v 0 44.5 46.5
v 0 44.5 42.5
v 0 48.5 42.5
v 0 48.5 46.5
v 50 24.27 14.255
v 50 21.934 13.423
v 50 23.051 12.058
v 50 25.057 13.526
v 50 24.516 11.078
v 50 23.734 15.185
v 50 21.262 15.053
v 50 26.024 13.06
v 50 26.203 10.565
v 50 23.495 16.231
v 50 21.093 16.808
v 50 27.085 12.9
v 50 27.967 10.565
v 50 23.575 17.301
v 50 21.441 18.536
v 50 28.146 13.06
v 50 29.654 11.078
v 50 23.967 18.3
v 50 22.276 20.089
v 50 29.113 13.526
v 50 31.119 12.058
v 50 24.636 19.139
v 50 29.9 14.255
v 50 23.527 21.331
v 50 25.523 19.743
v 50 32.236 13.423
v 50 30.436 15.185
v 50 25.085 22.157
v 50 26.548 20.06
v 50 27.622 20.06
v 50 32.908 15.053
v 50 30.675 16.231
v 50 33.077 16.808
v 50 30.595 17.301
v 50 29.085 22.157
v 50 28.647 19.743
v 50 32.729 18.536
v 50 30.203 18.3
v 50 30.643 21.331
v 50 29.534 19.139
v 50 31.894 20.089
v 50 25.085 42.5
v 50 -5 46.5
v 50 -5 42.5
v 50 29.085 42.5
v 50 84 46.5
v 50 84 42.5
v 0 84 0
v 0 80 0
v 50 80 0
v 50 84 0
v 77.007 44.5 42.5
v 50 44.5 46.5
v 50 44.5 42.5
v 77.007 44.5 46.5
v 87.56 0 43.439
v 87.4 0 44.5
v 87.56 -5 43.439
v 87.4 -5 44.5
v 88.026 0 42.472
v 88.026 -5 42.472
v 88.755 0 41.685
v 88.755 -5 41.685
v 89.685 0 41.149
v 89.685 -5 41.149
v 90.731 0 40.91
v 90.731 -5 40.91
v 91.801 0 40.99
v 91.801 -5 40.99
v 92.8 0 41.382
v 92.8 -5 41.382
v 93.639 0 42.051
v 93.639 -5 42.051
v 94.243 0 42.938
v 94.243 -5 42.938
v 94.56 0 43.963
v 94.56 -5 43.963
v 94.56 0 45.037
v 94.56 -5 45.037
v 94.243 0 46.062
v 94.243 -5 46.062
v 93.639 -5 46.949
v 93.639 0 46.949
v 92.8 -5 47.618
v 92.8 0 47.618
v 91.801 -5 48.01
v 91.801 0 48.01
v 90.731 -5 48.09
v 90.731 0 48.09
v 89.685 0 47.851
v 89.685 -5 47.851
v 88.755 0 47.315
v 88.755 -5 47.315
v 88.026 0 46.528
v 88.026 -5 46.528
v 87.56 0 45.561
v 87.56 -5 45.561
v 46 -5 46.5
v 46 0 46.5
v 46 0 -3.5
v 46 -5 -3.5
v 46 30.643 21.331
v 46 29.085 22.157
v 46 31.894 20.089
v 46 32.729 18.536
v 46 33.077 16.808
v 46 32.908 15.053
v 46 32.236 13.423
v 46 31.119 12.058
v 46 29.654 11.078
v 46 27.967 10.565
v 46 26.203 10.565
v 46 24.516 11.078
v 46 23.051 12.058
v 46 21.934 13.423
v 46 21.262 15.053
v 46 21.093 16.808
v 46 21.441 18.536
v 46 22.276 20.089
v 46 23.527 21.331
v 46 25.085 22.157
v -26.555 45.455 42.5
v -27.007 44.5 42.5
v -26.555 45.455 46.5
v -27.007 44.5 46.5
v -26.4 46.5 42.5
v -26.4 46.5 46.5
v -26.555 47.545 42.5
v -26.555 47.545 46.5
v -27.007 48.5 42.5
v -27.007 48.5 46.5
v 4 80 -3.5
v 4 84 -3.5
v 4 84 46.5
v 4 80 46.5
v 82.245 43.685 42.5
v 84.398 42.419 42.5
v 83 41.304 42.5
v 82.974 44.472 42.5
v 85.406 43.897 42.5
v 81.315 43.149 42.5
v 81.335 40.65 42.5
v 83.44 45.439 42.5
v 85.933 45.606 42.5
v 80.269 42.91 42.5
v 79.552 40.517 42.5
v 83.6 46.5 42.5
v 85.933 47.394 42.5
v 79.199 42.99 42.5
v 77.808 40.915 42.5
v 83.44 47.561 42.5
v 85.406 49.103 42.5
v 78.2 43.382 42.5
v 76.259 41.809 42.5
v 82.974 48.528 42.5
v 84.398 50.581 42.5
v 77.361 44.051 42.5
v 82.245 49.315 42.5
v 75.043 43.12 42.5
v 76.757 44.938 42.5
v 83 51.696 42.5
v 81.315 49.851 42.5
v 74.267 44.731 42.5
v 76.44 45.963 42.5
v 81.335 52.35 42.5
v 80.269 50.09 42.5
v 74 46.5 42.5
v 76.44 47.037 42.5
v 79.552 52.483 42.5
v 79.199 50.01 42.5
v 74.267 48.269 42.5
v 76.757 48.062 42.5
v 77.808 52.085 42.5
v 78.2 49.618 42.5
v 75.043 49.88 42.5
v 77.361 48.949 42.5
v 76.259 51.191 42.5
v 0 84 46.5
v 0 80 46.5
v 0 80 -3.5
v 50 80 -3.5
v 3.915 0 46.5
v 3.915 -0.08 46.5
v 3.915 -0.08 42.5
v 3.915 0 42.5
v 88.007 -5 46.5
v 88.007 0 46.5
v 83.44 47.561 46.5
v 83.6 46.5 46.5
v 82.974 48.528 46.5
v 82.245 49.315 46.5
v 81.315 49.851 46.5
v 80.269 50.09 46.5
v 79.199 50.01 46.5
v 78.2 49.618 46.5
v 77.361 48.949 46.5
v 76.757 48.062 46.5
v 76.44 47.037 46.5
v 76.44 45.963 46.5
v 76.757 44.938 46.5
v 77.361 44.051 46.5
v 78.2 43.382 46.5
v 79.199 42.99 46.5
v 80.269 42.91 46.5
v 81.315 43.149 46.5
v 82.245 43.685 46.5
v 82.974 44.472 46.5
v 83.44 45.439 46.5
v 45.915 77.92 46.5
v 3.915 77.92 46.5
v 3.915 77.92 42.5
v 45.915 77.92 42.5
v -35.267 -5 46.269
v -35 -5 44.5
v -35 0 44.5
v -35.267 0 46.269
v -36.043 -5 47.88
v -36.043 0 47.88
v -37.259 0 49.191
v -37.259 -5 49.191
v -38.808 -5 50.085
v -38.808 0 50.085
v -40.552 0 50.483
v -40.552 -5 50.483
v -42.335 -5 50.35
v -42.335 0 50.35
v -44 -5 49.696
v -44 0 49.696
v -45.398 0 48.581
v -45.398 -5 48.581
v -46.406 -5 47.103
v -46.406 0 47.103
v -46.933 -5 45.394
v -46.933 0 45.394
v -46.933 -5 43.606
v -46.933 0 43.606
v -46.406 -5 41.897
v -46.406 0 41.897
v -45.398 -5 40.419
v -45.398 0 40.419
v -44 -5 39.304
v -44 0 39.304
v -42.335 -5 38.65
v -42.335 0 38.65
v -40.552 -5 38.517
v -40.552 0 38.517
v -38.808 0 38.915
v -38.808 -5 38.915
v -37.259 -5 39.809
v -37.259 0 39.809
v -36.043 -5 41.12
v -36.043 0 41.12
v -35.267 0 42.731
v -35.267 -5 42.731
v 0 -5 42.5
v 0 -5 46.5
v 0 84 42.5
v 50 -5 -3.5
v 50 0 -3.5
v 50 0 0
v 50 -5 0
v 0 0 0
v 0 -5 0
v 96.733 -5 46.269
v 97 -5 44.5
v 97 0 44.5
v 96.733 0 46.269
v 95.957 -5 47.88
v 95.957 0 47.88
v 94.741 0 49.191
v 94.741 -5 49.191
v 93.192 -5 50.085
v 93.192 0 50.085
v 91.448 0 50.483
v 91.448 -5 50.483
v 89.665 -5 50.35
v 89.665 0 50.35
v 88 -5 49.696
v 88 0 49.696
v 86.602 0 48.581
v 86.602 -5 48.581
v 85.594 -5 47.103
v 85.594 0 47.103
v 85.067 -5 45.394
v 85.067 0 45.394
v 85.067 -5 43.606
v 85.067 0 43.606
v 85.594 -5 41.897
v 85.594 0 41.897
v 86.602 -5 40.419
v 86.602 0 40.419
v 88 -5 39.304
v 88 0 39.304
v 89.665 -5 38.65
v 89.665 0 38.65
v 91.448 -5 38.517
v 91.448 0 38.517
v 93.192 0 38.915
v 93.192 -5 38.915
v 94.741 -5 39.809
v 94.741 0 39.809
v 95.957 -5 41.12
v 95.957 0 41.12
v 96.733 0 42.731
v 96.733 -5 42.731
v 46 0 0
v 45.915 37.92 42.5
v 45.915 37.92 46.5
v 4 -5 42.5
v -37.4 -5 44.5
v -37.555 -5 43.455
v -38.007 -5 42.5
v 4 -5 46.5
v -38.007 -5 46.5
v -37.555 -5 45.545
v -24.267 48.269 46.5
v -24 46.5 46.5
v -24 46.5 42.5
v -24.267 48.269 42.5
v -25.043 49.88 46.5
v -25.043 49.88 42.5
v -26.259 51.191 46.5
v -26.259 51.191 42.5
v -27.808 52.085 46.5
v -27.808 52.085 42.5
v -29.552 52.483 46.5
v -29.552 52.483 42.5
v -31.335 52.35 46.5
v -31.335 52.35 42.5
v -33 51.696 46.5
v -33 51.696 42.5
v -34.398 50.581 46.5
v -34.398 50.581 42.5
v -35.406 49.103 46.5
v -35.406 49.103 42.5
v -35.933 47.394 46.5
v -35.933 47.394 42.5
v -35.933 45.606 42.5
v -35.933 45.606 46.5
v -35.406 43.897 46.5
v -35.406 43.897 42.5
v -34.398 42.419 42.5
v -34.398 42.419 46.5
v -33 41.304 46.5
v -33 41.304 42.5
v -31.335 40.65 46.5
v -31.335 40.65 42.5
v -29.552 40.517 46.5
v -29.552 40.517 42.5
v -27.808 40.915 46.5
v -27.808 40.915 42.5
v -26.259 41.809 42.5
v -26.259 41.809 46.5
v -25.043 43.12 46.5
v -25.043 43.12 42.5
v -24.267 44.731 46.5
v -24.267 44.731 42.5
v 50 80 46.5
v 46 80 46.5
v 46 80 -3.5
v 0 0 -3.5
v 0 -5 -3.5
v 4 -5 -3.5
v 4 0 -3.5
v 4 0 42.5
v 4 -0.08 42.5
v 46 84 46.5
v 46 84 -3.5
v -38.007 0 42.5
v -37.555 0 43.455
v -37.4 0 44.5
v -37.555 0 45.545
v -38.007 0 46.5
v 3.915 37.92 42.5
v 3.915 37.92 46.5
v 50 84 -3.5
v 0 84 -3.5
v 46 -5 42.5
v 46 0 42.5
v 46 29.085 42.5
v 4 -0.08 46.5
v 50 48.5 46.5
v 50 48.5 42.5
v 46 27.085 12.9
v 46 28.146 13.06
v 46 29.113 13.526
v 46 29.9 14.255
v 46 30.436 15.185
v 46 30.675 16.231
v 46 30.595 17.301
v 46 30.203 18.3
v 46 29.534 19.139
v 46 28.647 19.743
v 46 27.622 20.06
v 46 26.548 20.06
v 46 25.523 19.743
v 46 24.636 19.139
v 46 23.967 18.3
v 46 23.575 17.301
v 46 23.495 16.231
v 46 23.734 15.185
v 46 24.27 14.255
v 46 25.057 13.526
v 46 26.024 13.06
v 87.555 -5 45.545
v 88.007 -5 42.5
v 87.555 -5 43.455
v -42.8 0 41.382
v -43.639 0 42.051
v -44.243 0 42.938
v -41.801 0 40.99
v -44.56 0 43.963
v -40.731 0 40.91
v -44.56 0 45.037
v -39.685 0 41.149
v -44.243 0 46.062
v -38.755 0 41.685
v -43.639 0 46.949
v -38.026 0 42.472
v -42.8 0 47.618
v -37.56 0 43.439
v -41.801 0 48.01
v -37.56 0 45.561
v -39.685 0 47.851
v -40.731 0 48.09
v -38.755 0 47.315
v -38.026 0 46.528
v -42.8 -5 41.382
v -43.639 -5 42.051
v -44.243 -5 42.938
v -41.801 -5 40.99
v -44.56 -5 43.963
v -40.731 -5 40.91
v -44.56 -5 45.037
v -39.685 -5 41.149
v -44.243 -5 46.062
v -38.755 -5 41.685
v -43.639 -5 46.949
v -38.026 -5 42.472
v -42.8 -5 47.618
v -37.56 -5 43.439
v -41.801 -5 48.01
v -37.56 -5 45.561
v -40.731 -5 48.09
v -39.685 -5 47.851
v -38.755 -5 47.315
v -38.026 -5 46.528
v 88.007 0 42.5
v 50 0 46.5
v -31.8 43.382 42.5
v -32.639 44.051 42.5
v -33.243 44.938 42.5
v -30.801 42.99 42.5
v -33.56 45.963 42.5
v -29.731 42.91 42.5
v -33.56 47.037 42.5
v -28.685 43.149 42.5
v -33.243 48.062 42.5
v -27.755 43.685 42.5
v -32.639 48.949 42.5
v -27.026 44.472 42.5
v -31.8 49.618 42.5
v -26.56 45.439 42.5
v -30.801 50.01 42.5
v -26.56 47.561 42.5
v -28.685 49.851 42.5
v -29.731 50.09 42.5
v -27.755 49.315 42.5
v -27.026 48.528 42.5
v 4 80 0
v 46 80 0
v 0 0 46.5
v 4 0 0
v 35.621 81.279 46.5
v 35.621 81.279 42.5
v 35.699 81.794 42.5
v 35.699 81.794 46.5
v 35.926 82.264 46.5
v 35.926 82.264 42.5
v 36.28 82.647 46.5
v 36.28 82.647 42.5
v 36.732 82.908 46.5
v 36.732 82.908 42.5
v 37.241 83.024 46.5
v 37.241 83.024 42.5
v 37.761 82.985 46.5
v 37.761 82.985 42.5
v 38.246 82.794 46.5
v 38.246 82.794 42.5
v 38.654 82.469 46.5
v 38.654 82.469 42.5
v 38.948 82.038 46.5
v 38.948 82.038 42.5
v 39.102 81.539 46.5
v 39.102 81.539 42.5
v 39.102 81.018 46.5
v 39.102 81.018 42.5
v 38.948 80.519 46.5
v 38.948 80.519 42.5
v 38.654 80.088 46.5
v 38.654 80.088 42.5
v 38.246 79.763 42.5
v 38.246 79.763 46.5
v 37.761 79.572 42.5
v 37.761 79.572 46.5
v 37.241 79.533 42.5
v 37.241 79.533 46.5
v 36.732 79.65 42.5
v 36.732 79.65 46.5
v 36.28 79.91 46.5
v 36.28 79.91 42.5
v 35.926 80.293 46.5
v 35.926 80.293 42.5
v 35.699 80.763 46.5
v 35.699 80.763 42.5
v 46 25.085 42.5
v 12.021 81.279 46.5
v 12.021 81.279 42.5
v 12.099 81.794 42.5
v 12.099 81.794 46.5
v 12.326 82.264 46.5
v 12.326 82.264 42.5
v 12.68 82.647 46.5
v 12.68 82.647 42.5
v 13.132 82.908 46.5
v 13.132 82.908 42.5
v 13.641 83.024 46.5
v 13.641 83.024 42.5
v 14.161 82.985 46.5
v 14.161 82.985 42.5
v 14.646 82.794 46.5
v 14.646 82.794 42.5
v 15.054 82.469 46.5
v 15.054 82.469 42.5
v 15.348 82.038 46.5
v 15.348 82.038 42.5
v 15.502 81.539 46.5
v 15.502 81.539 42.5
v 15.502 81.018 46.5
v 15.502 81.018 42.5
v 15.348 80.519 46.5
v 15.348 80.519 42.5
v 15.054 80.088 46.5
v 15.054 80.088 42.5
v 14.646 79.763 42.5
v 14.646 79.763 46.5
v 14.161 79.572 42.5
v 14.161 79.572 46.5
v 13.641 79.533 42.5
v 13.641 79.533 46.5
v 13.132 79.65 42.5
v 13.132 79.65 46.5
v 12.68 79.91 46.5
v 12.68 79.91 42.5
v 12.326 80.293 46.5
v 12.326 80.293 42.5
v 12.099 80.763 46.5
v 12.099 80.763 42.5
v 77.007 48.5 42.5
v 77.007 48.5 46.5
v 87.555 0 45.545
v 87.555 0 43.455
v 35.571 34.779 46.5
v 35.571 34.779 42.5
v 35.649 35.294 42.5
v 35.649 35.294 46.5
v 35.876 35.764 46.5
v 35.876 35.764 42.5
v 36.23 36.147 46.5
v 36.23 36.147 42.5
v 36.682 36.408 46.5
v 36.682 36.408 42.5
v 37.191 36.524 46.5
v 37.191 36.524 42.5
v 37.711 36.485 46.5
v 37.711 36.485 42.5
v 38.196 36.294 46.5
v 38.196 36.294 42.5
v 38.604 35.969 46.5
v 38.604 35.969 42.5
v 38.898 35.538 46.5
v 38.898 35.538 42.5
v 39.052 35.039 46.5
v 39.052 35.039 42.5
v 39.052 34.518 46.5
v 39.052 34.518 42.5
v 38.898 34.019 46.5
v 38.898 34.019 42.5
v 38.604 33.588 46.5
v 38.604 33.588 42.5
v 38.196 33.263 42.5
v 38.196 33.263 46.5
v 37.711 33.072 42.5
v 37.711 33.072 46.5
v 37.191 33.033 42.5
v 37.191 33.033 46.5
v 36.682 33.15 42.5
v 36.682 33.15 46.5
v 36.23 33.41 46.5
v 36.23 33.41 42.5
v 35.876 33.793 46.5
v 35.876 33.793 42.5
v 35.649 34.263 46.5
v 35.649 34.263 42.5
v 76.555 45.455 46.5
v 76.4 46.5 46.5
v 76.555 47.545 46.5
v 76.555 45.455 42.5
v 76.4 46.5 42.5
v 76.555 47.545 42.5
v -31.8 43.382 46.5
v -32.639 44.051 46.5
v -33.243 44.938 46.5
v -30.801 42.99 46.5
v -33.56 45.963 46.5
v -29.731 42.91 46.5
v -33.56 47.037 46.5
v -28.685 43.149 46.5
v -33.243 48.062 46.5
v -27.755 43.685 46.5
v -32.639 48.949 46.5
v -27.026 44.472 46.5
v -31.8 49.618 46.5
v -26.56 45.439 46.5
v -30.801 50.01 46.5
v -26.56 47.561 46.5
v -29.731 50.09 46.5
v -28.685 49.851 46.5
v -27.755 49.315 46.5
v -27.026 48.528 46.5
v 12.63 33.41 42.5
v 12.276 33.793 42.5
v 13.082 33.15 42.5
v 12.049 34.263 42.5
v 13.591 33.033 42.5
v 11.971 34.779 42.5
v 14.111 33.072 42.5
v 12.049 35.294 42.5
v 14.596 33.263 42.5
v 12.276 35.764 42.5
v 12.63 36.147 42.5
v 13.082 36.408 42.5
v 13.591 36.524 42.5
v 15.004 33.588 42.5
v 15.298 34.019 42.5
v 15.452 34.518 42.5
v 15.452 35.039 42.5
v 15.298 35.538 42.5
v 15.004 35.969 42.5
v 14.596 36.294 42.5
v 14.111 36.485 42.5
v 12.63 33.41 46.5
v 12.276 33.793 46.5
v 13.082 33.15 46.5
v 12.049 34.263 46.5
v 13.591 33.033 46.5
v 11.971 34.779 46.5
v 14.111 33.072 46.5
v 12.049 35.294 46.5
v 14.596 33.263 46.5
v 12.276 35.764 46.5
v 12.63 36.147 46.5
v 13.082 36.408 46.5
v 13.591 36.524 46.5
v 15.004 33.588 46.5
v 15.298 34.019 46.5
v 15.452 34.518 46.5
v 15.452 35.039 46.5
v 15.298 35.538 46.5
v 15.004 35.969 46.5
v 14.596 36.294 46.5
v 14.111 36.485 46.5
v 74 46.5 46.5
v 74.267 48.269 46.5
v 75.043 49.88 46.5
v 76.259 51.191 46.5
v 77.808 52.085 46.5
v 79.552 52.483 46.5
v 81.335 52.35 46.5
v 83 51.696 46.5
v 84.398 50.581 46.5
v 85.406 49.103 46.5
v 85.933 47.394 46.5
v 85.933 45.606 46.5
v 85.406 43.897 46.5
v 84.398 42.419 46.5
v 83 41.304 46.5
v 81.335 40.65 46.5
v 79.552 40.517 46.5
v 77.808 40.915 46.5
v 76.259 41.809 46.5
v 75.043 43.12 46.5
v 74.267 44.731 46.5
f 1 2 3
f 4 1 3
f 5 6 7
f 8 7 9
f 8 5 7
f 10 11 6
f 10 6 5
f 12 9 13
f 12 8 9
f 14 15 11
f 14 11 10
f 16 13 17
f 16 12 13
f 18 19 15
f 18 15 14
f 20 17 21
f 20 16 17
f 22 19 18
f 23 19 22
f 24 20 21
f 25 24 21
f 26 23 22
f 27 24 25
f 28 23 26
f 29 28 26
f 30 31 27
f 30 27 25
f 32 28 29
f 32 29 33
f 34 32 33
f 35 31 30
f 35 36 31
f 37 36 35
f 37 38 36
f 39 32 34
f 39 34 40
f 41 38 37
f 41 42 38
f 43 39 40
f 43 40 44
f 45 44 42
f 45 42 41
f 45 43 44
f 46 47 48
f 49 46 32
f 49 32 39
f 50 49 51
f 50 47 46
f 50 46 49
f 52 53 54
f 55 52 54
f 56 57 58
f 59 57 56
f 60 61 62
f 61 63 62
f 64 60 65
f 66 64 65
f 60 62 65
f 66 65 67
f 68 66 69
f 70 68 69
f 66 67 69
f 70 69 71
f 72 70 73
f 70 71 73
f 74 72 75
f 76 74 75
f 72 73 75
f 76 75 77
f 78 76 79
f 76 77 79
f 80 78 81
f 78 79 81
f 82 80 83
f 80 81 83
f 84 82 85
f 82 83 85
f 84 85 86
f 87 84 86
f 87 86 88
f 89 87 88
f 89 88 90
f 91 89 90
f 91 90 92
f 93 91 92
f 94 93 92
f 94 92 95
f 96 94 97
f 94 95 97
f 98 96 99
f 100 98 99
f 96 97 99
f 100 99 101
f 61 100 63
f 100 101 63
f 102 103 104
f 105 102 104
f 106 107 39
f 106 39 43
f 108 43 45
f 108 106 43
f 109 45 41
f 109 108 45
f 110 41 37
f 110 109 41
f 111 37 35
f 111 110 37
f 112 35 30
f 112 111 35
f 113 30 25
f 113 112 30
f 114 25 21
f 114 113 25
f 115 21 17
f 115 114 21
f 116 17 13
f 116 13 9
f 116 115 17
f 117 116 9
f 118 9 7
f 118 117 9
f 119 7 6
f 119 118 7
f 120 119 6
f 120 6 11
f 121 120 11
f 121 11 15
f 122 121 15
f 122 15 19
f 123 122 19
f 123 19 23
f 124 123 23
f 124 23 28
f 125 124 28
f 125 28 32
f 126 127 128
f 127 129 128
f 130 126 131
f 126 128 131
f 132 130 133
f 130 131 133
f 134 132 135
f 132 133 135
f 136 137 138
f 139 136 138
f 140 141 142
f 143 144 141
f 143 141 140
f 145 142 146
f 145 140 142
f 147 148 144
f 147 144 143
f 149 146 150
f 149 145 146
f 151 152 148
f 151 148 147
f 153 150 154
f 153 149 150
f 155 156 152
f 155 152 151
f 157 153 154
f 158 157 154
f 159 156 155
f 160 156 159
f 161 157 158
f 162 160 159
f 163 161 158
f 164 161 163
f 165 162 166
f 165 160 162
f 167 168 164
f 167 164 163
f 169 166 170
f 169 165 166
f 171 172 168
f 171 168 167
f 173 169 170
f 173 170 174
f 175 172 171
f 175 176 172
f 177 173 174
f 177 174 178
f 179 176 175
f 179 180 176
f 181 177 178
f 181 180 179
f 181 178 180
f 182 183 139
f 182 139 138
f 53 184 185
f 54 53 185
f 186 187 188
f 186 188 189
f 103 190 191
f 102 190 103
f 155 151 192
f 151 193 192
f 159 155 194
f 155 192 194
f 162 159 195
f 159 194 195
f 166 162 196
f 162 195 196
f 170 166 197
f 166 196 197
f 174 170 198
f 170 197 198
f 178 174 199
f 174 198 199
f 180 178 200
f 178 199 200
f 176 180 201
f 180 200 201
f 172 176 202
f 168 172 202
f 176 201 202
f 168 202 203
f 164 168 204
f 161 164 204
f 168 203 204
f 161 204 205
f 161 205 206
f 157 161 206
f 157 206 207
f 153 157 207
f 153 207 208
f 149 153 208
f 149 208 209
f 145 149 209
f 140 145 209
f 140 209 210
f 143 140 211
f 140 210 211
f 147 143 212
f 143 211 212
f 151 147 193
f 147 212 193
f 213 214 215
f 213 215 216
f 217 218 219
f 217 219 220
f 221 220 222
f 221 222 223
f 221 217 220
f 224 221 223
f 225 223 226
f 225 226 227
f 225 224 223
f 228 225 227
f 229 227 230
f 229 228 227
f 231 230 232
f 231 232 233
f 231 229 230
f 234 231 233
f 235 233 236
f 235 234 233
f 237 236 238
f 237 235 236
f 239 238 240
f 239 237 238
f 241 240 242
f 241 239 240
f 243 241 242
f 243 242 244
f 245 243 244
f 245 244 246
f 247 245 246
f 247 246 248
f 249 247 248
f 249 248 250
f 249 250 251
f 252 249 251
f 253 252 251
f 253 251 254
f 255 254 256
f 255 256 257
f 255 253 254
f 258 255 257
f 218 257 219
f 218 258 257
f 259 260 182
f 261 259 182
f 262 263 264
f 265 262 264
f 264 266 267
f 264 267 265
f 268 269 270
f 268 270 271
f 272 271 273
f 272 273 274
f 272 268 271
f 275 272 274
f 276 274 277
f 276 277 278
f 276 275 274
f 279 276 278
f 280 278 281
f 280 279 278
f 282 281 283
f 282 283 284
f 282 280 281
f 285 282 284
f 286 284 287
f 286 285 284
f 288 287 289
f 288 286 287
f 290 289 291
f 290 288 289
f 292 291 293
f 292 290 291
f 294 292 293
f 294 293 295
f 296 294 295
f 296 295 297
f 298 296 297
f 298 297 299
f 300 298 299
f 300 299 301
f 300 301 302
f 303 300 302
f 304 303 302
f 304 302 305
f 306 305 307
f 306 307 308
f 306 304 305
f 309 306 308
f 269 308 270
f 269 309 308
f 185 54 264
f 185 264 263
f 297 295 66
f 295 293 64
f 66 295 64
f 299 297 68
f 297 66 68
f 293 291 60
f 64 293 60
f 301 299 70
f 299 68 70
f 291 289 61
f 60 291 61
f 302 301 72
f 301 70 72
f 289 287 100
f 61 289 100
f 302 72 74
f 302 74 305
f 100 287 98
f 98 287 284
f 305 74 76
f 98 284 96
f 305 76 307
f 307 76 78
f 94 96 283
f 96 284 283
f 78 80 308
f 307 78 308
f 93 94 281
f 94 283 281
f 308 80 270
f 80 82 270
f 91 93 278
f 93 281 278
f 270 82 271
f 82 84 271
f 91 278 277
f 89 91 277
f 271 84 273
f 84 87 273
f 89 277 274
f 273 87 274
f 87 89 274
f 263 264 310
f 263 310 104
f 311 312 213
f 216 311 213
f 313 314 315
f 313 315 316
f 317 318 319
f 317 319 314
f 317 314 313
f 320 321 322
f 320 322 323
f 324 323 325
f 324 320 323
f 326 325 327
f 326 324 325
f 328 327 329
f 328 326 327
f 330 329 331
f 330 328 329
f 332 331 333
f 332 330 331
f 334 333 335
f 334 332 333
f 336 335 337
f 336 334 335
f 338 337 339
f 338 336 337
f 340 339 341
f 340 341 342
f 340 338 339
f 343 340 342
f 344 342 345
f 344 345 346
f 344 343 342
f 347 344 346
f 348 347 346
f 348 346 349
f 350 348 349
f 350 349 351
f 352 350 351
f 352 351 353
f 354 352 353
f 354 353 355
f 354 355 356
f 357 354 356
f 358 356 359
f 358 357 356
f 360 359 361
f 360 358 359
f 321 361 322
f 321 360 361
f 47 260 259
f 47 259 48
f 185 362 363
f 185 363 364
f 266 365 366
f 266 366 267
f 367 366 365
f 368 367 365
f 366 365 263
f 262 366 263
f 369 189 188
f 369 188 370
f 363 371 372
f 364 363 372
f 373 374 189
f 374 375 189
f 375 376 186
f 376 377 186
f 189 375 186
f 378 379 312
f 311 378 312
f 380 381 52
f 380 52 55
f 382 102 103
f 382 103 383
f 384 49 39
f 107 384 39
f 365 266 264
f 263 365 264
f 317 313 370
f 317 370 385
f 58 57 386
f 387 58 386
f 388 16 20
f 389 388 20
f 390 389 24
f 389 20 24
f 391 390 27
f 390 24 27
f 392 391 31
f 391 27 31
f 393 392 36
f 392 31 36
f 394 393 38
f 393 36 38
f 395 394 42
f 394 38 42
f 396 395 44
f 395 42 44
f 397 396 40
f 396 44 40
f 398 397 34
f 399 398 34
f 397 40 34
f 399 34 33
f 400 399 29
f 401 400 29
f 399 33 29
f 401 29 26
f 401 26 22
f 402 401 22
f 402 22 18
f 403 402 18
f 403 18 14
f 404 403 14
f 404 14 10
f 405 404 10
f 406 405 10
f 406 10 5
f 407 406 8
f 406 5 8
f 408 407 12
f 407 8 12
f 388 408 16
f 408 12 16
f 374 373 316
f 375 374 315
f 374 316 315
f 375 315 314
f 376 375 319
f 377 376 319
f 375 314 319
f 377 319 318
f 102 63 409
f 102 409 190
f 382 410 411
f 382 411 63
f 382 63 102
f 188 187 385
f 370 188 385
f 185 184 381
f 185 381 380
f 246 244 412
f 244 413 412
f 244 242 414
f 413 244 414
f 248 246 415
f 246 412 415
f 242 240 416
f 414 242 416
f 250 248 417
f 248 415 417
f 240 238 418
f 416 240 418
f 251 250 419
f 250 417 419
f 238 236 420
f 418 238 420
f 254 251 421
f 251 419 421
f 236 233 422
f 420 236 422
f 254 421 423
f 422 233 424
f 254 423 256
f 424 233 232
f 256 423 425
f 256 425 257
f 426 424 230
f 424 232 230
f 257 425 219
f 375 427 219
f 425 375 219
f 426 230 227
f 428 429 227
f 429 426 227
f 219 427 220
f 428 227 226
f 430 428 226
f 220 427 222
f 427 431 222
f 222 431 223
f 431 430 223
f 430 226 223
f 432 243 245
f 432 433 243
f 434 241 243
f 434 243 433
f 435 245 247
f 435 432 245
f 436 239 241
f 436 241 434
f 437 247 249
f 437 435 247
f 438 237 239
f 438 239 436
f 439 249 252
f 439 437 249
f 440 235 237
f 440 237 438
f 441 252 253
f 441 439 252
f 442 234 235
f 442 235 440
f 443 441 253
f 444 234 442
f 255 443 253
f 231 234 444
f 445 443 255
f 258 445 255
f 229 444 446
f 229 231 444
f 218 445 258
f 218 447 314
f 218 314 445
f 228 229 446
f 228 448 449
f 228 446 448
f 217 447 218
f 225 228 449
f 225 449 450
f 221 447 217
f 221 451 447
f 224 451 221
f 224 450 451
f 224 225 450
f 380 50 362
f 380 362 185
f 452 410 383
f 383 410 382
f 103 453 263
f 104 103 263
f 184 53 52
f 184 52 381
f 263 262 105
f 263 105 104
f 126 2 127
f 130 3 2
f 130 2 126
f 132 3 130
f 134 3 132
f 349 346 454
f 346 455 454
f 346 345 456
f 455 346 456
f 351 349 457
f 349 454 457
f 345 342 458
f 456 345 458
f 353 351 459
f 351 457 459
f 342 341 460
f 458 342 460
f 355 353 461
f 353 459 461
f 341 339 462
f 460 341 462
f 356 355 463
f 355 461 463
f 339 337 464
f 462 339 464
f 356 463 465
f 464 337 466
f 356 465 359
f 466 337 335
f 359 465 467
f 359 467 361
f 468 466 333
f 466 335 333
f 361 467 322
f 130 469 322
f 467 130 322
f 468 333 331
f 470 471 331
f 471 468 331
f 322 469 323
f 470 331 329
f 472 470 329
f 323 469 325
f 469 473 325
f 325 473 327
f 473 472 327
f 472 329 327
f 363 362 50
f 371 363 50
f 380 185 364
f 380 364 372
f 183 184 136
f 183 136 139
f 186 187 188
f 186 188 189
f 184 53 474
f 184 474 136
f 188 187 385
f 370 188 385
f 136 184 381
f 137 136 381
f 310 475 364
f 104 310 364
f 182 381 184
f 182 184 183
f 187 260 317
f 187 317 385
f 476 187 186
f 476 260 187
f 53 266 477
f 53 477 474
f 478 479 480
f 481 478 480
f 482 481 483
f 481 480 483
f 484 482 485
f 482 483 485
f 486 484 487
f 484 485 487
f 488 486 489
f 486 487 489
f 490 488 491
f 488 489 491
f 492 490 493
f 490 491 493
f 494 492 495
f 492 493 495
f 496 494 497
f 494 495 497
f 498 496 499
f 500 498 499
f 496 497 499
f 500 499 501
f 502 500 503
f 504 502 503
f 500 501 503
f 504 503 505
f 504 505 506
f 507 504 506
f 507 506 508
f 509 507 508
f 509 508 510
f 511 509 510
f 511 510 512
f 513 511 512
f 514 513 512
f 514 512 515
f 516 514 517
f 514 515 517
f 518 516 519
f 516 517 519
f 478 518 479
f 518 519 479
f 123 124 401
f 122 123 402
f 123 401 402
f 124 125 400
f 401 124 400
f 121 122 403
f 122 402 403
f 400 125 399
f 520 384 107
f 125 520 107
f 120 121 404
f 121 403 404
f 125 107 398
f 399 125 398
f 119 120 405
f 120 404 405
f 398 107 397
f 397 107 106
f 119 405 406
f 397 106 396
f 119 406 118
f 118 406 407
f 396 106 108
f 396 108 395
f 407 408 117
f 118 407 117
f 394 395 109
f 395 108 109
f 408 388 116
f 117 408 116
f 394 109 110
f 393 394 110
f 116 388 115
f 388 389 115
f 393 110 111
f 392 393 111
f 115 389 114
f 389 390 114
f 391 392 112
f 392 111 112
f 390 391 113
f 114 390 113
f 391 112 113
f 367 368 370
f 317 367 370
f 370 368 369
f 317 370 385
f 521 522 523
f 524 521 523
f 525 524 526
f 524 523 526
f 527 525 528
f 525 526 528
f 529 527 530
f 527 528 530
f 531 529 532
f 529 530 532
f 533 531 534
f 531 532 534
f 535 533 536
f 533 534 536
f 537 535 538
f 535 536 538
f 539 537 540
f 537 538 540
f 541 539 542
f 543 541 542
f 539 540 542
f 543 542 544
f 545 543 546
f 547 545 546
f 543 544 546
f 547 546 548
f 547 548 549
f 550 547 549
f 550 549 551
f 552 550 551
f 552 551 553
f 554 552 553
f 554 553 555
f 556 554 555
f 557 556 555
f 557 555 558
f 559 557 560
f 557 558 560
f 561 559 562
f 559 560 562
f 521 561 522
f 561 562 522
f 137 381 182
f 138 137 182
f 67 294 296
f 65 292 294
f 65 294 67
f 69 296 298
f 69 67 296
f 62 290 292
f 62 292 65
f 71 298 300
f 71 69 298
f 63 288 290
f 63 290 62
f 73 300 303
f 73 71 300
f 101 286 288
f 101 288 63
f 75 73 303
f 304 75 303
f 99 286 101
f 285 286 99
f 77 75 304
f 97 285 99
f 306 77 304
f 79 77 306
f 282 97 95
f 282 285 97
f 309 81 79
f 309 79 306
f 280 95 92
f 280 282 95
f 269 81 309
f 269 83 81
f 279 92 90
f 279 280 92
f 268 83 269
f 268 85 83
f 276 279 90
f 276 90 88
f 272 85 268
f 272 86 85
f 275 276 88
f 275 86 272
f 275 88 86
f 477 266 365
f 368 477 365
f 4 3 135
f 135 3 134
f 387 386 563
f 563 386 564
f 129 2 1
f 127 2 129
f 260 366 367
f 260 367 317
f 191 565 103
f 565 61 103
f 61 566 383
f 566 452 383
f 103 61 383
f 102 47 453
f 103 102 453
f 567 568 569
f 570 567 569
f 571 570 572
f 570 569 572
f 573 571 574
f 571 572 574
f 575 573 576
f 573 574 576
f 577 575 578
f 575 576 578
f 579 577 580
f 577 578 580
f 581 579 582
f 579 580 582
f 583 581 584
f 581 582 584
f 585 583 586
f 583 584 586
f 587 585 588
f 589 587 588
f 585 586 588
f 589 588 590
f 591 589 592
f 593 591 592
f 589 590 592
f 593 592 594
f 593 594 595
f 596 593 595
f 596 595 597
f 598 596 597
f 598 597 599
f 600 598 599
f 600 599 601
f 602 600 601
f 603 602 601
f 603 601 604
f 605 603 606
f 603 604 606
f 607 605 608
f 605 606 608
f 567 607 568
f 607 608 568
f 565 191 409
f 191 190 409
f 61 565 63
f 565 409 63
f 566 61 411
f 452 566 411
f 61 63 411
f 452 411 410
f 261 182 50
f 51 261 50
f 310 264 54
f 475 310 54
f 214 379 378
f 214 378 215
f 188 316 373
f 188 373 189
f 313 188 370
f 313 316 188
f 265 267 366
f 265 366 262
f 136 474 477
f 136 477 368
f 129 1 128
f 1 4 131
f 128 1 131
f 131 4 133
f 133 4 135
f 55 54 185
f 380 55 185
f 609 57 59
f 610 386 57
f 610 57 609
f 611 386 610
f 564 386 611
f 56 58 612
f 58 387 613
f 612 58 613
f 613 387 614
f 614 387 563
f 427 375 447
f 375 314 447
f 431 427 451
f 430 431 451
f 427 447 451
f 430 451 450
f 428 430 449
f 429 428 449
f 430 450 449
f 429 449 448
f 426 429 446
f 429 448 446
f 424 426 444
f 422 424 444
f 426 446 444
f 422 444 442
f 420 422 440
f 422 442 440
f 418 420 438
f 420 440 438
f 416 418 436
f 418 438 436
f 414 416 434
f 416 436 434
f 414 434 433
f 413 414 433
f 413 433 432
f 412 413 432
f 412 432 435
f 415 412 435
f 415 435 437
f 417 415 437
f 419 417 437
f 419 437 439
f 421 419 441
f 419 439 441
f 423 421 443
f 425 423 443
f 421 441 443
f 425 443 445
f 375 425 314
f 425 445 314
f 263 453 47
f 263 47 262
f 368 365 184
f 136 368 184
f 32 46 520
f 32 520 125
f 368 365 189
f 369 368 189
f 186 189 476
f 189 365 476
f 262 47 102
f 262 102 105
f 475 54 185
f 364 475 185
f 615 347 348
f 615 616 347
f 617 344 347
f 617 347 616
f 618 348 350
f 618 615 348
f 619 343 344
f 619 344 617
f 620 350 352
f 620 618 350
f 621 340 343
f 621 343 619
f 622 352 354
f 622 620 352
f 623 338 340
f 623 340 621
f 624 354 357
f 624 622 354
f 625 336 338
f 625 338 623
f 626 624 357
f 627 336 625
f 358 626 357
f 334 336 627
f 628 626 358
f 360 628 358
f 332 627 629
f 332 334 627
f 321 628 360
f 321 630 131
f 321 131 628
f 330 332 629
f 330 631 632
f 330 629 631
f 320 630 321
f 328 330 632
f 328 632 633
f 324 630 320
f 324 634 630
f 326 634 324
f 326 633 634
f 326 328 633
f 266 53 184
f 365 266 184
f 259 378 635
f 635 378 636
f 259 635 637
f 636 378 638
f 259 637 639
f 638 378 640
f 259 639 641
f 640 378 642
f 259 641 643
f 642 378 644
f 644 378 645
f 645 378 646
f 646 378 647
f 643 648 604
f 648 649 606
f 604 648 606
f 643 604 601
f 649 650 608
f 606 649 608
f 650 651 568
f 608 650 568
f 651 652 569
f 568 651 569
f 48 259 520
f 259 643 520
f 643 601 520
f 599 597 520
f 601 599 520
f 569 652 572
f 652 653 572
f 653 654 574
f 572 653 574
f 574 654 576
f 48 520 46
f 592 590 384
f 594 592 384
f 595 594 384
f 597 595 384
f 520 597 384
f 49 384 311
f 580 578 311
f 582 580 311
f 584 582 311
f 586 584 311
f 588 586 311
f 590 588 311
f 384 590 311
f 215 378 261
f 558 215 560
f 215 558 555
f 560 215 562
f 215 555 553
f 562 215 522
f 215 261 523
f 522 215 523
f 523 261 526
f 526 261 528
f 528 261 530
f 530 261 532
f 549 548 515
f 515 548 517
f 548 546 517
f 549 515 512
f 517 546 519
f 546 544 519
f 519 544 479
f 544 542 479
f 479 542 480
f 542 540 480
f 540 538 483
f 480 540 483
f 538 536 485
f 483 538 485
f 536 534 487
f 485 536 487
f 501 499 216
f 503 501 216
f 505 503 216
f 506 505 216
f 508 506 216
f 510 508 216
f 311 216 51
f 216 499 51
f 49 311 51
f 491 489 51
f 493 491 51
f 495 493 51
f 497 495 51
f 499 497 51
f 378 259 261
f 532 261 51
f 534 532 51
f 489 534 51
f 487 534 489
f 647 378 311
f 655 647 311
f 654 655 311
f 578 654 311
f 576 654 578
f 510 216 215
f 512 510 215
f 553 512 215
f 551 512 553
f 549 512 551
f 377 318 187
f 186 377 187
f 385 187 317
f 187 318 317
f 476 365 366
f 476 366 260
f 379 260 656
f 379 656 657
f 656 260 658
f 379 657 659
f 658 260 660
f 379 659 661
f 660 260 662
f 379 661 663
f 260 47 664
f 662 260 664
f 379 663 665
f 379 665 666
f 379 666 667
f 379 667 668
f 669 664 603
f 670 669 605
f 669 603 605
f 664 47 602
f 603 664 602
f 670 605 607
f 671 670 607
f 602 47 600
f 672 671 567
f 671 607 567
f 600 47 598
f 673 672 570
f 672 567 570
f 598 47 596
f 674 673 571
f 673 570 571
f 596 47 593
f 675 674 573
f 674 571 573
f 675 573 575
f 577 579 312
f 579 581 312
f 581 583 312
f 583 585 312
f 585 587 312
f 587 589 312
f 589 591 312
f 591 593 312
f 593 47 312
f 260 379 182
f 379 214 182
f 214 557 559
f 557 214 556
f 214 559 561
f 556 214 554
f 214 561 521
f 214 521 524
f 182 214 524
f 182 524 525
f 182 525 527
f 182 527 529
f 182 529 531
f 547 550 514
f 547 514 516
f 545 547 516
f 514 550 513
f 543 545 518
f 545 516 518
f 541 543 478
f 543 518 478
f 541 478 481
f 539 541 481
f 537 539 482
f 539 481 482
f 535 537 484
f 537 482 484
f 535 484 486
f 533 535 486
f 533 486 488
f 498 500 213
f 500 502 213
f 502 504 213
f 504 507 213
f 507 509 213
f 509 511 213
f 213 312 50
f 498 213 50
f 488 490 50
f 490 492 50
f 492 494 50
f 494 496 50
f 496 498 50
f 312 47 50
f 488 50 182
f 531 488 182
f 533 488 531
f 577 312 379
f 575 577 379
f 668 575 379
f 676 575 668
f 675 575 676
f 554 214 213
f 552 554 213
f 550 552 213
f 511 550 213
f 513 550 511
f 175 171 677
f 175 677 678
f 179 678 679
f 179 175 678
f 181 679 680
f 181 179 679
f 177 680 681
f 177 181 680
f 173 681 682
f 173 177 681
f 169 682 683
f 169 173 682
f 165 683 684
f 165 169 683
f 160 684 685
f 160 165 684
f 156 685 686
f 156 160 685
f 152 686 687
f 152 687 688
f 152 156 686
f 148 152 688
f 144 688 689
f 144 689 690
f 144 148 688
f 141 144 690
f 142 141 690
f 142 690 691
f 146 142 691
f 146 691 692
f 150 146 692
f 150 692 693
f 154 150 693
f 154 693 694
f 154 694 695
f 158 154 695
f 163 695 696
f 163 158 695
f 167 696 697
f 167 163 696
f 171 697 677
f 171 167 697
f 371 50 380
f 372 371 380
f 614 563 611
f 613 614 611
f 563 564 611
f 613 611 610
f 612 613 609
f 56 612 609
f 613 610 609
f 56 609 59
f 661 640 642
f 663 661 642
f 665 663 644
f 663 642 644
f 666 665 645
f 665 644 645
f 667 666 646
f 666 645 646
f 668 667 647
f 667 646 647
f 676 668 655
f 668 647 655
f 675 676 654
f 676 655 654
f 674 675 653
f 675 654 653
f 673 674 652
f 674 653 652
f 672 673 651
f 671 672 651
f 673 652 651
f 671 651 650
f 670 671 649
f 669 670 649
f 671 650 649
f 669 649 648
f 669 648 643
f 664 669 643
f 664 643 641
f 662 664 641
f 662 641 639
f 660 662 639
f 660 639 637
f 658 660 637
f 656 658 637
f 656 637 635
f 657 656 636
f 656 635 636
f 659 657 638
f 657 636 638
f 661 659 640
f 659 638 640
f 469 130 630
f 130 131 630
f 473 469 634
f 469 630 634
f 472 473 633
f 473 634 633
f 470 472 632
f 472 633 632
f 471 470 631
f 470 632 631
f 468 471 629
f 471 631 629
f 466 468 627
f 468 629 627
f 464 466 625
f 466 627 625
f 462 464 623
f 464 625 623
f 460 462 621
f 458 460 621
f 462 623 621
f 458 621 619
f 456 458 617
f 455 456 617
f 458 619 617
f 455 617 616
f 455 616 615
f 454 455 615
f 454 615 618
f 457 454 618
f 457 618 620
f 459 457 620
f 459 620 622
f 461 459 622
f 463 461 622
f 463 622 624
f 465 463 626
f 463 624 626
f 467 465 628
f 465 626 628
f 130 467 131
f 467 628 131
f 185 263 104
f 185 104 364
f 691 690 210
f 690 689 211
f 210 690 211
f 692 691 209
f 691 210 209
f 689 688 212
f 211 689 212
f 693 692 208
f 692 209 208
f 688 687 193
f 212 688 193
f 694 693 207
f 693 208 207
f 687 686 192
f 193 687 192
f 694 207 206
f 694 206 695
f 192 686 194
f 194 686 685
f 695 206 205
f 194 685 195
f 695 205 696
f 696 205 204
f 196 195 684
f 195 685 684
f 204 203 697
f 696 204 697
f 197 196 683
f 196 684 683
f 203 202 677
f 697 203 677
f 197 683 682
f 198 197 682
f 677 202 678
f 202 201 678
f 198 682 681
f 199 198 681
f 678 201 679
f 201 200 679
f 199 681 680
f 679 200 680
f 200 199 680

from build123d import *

# Parameters (mm, degrees)
SKETCH114_W             = 3.5
SKETCH114_H             = 80
BOSS_EXTRUDE2_DEPTH     = 4
SKETCH115_W             = 50
SKETCH115_H             = 3.5
BOSS_EXTRUDE3_DEPTH     = 4
SKETCH116_W             = 3.5
SKETCH116_H             = 80
BOSS_EXTRUDE5_DEPTH     = 4
SKETCH117_W             = 50
SKETCH117_H             = 3.5
BOSS_EXTRUDE6_DEPTH     = 5
SKETCH119_W             = 50
SKETCH119_H             = 5
BOSS_EXTRUDE7_DEPTH     = 4
SKETCH119_H_2           = 4
BOSS_EXTRUDE7_2_DEPTH   = 4
SKETCH122_W             = 50
SKETCH122_H             = 4
BOSS_EXTRUDE8_DEPTH     = 4
SKETCH122_H_2           = 5
BOSS_EXTRUDE8_2_DEPTH   = 4
SKETCH134_W             = 50
SKETCH134_H             = 89
BOSS_EXTRUDE18_DEPTH    = 4
SKETCH135_W             = 45
SKETCH135_H             = 4
BOSS_EXTRUDE19_DEPTH    = 5
SKETCH136_W             = 45
SKETCH136_H             = 4
BOSS_EXTRUDE21_DEPTH    = 5
SKETCH137_R             = 6
BOSS_EXTRUDE22_DEPTH    = 5
SKETCH139_R             = 3.6
CUT_EXTRUDE1_DEPTH      = 10
CUT_EXTRUDE1_DEPTH_BACK = 38
SKETCH140_R             = 6
BOSS_EXTRUDE23_DEPTH    = 5
SKETCH143_R             = 3.6
CUT_EXTRUDE2_DEPTH      = 29
CUT_EXTRUDE2_DEPTH_BACK = 17
SKETCH145_W             = 30
SKETCH145_H             = 4
BOSS_EXTRUDE26_DEPTH    = 4
SKETCH146_R             = 6
BOSS_EXTRUDE27_DEPTH    = 4
SKETCH147_R             = 3.6
CUT_EXTRUDE3_DEPTH      = 11
CUT_EXTRUDE3_DEPTH_BACK = 21
SKETCH148_W             = 30
SKETCH148_H             = 4
BOSS_EXTRUDE28_DEPTH    = 4
SKETCH149_R             = 6
BOSS_EXTRUDE29_DEPTH    = 4
SKETCH150_R             = 3.6
CUT_EXTRUDE4_DEPTH      = 12
CUT_EXTRUDE4_DEPTH_BACK = 14
SKETCH156_W             = 42
SKETCH156_H             = 78
CUT_EXTRUDE8_DEPTH      = 4
SKETCH159_W             = 30
SKETCH159_H             = 4
BOSS_EXTRUDE31_DEPTH    = 4
SKETCH160_R             = 6
BOSS_EXTRUDE32_DEPTH    = 4
SKETCH161_R             = 3.6
CUT_EXTRUDE10_DEPTH     = 4
SKETCH162_W             = 42
SKETCH162_H             = 42.813081775
BOSS_EXTRUDE34_DEPTH    = 4
SKETCH164_R             = 1.75
CUT_EXTRUDE12_DEPTH     = 4


with BuildPart() as part:
    # Sketch114 → Boss-Extrude2 (new body)
    with BuildSketch(Plane(origin=(0, 0, 0), x_dir=(0, 0, -1), z_dir=(1, 0, 0))):
        with Locations((1.75, 40)):
            Rectangle(SKETCH114_W, SKETCH114_H)
    extrude(amount=BOSS_EXTRUDE2_DEPTH)


with BuildPart() as body_2:
    # Sketch115 → Boss-Extrude3 (new body)
    with BuildSketch(Plane(origin=(0, 80, 0), x_dir=(1, 0, 0), z_dir=(0, 1, 0))):
        with Locations((25, 1.75)):
            Rectangle(SKETCH115_W, SKETCH115_H)
    extrude(amount=BOSS_EXTRUDE3_DEPTH)


with BuildPart() as body_3:
    # Sketch116 → Boss-Extrude5 (new body)
    with BuildSketch(Plane(origin=(50, 0, 0), x_dir=(0, 0, -1), z_dir=(1, 0, 0))):
        with Locations((1.75, 40)):
            Rectangle(SKETCH116_W, SKETCH116_H)
    extrude(amount=-BOSS_EXTRUDE5_DEPTH)


with BuildPart() as body_4:
    # Sketch117 → Boss-Extrude6 (new body)
    with BuildSketch(Plane.XZ):
        with Locations((25, -1.75)):
            Rectangle(SKETCH117_W, SKETCH117_H)
    extrude(amount=BOSS_EXTRUDE6_DEPTH)


with BuildPart() as body_5:
    # Sketch119 → Boss-Extrude7 (new body)
    with BuildSketch(Plane(origin=(50, 0, 0), x_dir=(0, 0, -1), z_dir=(1, 0, 0))):
        with Locations((-21.5, -2.5)):
            Rectangle(SKETCH119_W, SKETCH119_H)
    extrude(amount=-BOSS_EXTRUDE7_DEPTH)


with BuildPart() as body_6:
    # Sketch119 → Boss-Extrude7 2 (new body)
    with BuildSketch(Plane(origin=(50, 0, 0), x_dir=(0, 0, -1), z_dir=(1, 0, 0))):
        with Locations((-21.5, 82)):
            Rectangle(SKETCH119_W, SKETCH119_H_2)
    extrude(amount=-BOSS_EXTRUDE7_2_DEPTH)


with BuildPart() as body_7:
    # Sketch122 → Boss-Extrude8 (new body)
    with BuildSketch(Plane.ZY):
        with Locations((21.5, 82)):
            Rectangle(SKETCH122_W, SKETCH122_H)
    extrude(amount=-BOSS_EXTRUDE8_DEPTH)


with BuildPart() as body_8:
    # Sketch122 → Boss-Extrude8 2 (new body)
    with BuildSketch(Plane.ZY):
        with Locations((21.5, -2.5)):
            Rectangle(SKETCH122_W, SKETCH122_H_2)
    extrude(amount=-BOSS_EXTRUDE8_2_DEPTH)


with BuildPart() as body_9:
    # Sketch134 → Boss-Extrude18 (new body)
    with BuildSketch(Plane.XY.offset(46.5)):
        with Locations((25, 39.5)):
            Rectangle(SKETCH134_W, SKETCH134_H)
    extrude(amount=-BOSS_EXTRUDE18_DEPTH)


with BuildPart() as body_10:
    # Sketch135 → Boss-Extrude19 (new body)
    with BuildSketch(Plane(origin=(0, -5, 0), x_dir=(-1, 0, 0), z_dir=(0, -1, 0))):
        with Locations((-68.5, -44.5)):
            Rectangle(SKETCH135_W, SKETCH135_H)
    extrude(amount=-BOSS_EXTRUDE19_DEPTH)


with BuildPart() as body_11:
    # Sketch136 → Boss-Extrude21 (new body)
    with BuildSketch(Plane.XZ.offset(5)):
        with Locations((-18.5, 44.5)):
            Rectangle(SKETCH136_W, SKETCH136_H)
    extrude(amount=-BOSS_EXTRUDE21_DEPTH)


with BuildPart() as body_12:
    # Sketch137 → Boss-Extrude22 (new body)
    with BuildSketch(Plane.XZ.offset(5)):
        with Locations((91, 44.5)):
            Circle(SKETCH137_R)
    extrude(amount=-BOSS_EXTRUDE22_DEPTH)


with BuildPart() as cut_extrude1_tool:
    # Sketch139 → Cut-Extrude1 (new body, two sides)
    with BuildSketch(Plane(origin=(0, -5, 0), x_dir=(-1, 0, 0), z_dir=(0, -1, 0))) as cut_extrude1_sk:
        with Locations((-91, -44.5)):
            Circle(SKETCH139_R)
    extrude(amount=CUT_EXTRUDE1_DEPTH)
    extrude(cut_extrude1_sk.sketch, amount=-CUT_EXTRUDE1_DEPTH_BACK)


with BuildPart() as body_10_1:
    add(body_10.part)

    # Cut-Extrude1: cut by cut_extrude1_tool
    add(cut_extrude1_tool.part, mode=Mode.SUBTRACT)


with BuildPart() as body_12_1:
    add(body_12.part)

    # Cut-Extrude1: cut by cut_extrude1_tool
    add(cut_extrude1_tool.part, mode=Mode.SUBTRACT)


with BuildPart() as body_13:
    # Sketch140 → Boss-Extrude23 (new body)
    with BuildSketch(Plane.XZ.offset(5)):
        with Locations((-41, 44.5)):
            Circle(SKETCH140_R)
    extrude(amount=-BOSS_EXTRUDE23_DEPTH)


with BuildPart() as cut_extrude2_tool:
    # Sketch143 → Cut-Extrude2 (new body, two sides)
    with BuildSketch(Plane.XZ.offset(5)) as cut_extrude2_sk:
        with Locations((-41, 44.5)):
            Circle(SKETCH143_R)
    extrude(amount=CUT_EXTRUDE2_DEPTH)
    extrude(cut_extrude2_sk.sketch, amount=-CUT_EXTRUDE2_DEPTH_BACK)


with BuildPart() as body_11_1:
    add(body_11.part)

    # Cut-Extrude2: cut by cut_extrude2_tool
    add(cut_extrude2_tool.part, mode=Mode.SUBTRACT)


with BuildPart() as body_13_1:
    add(body_13.part)

    # Cut-Extrude2: cut by cut_extrude2_tool
    add(cut_extrude2_tool.part, mode=Mode.SUBTRACT)


with BuildPart() as body_14:
    # Sketch145 → Boss-Extrude26 (new body)
    with BuildSketch(Plane(origin=(0, 5, 42.5), x_dir=(-1, 0, 0), z_dir=(0, 0, -1))):
        with Locations((15, 41.5)):
            Rectangle(SKETCH145_W, SKETCH145_H)
    extrude(amount=-BOSS_EXTRUDE26_DEPTH)


with BuildPart() as body_15:
    # Sketch146 → Boss-Extrude27 (new body)
    with BuildSketch(Plane(origin=(0, 5, 46.5), x_dir=(1, 0, 0), z_dir=(0, 0, 1))):
        with Locations((-30, 41.5)):
            Circle(SKETCH146_R)
    extrude(amount=-BOSS_EXTRUDE27_DEPTH)


with BuildPart() as cut_extrude3_tool:
    # Sketch147 → Cut-Extrude3 (new body, two sides)
    with BuildSketch(Plane(origin=(0, 5, 46.5), x_dir=(1, 0, 0), z_dir=(0, 0, 1))) as cut_extrude3_sk:
        with Locations((-30, 41.5)):
            Circle(SKETCH147_R)
    extrude(amount=CUT_EXTRUDE3_DEPTH)
    extrude(cut_extrude3_sk.sketch, amount=-CUT_EXTRUDE3_DEPTH_BACK)


with BuildPart() as body_14_1:
    add(body_14.part)

    # Cut-Extrude3: cut by cut_extrude3_tool
    add(cut_extrude3_tool.part, mode=Mode.SUBTRACT)


with BuildPart() as body_15_1:
    add(body_15.part)

    # Cut-Extrude3: cut by cut_extrude3_tool
    add(cut_extrude3_tool.part, mode=Mode.SUBTRACT)


with BuildPart() as body_16:
    # Sketch148 → Boss-Extrude28 (new body)
    with BuildSketch(Plane(origin=(0, 5, 46.5), x_dir=(1, 0, 0), z_dir=(0, 0, 1))):
        with Locations((65, 41.5)):
            Rectangle(SKETCH148_W, SKETCH148_H)
    extrude(amount=-BOSS_EXTRUDE28_DEPTH)


with BuildPart() as body_17:
    # Sketch149 → Boss-Extrude29 (new body)
    with BuildSketch(Plane(origin=(0, 5, 42.5), x_dir=(-1, 0, 0), z_dir=(0, 0, -1))):
        with Locations((-80, 41.5)):
            Circle(SKETCH149_R)
    extrude(amount=-BOSS_EXTRUDE29_DEPTH)


with BuildPart() as cut_extrude4_tool:
    # Sketch150 → Cut-Extrude4 (new body, two sides)
    with BuildSketch(Plane(origin=(0, 5, 46.5), x_dir=(1, 0, 0), z_dir=(0, 0, 1))) as cut_extrude4_sk:
        with Locations((80, 41.5)):
            Circle(SKETCH150_R)
    extrude(amount=CUT_EXTRUDE4_DEPTH)
    extrude(cut_extrude4_sk.sketch, amount=-CUT_EXTRUDE4_DEPTH_BACK)


with BuildPart() as body_16_1:
    add(body_16.part)

    # Cut-Extrude4: cut by cut_extrude4_tool
    add(cut_extrude4_tool.part, mode=Mode.SUBTRACT)


with BuildPart() as body_17_1:
    add(body_17.part)

    # Cut-Extrude4: cut by cut_extrude4_tool
    add(cut_extrude4_tool.part, mode=Mode.SUBTRACT)


with BuildPart() as cut_extrude8_tool:
    # Sketch156 → Cut-Extrude8 (new body)
    with BuildSketch(Plane.XY.offset(46.5)):
        with Locations((24.914818012, 38.92021053)):
            Rectangle(SKETCH156_W, SKETCH156_H)
    extrude(amount=-CUT_EXTRUDE8_DEPTH)


with BuildPart() as body_8_1:
    add(body_8.part)

    # Cut-Extrude8: cut by cut_extrude8_tool
    add(cut_extrude8_tool.part, mode=Mode.SUBTRACT)


with BuildPart() as body_9_1:
    add(body_9.part)

    # Cut-Extrude8: cut by cut_extrude8_tool
    add(cut_extrude8_tool.part, mode=Mode.SUBTRACT)

    # Sketch159 → Boss-Extrude31 (add)
    with BuildSketch(Plane(origin=(50, 0, 0), x_dir=(0, 0, -1), z_dir=(1, 0, 0))):
        with Locations((-31.5, 27.085014073)):
            Rectangle(SKETCH159_W, SKETCH159_H)
    extrude(amount=-BOSS_EXTRUDE31_DEPTH)

    # Sketch160 → Boss-Extrude32 (add)
    with BuildSketch(Plane.ZY.offset(-46)):
        with Locations((16.5, 27.085014073)):
            Circle(SKETCH160_R)
    extrude(amount=-BOSS_EXTRUDE32_DEPTH)

    # Sketch161 → Cut-Extrude10 (cut)
    with BuildSketch(Plane(origin=(50, 0, 0), x_dir=(0, 0, -1), z_dir=(1, 0, 0))):
        with Locations((-16.5, 27.085014073)):
            Circle(SKETCH161_R)
    extrude(amount=-CUT_EXTRUDE10_DEPTH, mode=Mode.SUBTRACT)

    # Sketch162 → Boss-Extrude34 (add)
    with BuildSketch(Plane.XY.offset(46.5)):
        with Locations((24.914818012, 16.513669643)):
            Rectangle(SKETCH162_W, SKETCH162_H)
    extrude(amount=-BOSS_EXTRUDE34_DEPTH)

    # Sketch164 → Cut-Extrude12 (cut)
    with BuildSketch(Plane(origin=(0, 0, 42.5), x_dir=(-1, 0, 0), z_dir=(0, 0, -1))):
        with Locations((-13.771446852, 81.278551211)):
            Circle(SKETCH164_R)
        with Locations((-37.371446852, 81.278551211)):
            Circle(SKETCH164_R)
        with Locations((-37.321446148, 34.778551211)):
            Circle(SKETCH164_R)
        with Locations((-13.721446148, 34.778551211)):
            Circle(SKETCH164_R)
    extrude(amount=-CUT_EXTRUDE12_DEPTH, mode=Mode.SUBTRACT)


with BuildPart() as body_11_2:
    add(body_11_1.part)

    # Cut-Extrude8: cut by cut_extrude8_tool
    add(cut_extrude8_tool.part, mode=Mode.SUBTRACT)


solid = Compound([part.part, body_2.part, body_3.part, body_4.part, body_5.part, body_6.part, body_7.part, body_10_1.part, body_12_1.part, body_13_1.part, body_14_1.part, body_15_1.part, body_16_1.part, body_17_1.part, body_8_1.part, body_9_1.part, body_11_2.part])
